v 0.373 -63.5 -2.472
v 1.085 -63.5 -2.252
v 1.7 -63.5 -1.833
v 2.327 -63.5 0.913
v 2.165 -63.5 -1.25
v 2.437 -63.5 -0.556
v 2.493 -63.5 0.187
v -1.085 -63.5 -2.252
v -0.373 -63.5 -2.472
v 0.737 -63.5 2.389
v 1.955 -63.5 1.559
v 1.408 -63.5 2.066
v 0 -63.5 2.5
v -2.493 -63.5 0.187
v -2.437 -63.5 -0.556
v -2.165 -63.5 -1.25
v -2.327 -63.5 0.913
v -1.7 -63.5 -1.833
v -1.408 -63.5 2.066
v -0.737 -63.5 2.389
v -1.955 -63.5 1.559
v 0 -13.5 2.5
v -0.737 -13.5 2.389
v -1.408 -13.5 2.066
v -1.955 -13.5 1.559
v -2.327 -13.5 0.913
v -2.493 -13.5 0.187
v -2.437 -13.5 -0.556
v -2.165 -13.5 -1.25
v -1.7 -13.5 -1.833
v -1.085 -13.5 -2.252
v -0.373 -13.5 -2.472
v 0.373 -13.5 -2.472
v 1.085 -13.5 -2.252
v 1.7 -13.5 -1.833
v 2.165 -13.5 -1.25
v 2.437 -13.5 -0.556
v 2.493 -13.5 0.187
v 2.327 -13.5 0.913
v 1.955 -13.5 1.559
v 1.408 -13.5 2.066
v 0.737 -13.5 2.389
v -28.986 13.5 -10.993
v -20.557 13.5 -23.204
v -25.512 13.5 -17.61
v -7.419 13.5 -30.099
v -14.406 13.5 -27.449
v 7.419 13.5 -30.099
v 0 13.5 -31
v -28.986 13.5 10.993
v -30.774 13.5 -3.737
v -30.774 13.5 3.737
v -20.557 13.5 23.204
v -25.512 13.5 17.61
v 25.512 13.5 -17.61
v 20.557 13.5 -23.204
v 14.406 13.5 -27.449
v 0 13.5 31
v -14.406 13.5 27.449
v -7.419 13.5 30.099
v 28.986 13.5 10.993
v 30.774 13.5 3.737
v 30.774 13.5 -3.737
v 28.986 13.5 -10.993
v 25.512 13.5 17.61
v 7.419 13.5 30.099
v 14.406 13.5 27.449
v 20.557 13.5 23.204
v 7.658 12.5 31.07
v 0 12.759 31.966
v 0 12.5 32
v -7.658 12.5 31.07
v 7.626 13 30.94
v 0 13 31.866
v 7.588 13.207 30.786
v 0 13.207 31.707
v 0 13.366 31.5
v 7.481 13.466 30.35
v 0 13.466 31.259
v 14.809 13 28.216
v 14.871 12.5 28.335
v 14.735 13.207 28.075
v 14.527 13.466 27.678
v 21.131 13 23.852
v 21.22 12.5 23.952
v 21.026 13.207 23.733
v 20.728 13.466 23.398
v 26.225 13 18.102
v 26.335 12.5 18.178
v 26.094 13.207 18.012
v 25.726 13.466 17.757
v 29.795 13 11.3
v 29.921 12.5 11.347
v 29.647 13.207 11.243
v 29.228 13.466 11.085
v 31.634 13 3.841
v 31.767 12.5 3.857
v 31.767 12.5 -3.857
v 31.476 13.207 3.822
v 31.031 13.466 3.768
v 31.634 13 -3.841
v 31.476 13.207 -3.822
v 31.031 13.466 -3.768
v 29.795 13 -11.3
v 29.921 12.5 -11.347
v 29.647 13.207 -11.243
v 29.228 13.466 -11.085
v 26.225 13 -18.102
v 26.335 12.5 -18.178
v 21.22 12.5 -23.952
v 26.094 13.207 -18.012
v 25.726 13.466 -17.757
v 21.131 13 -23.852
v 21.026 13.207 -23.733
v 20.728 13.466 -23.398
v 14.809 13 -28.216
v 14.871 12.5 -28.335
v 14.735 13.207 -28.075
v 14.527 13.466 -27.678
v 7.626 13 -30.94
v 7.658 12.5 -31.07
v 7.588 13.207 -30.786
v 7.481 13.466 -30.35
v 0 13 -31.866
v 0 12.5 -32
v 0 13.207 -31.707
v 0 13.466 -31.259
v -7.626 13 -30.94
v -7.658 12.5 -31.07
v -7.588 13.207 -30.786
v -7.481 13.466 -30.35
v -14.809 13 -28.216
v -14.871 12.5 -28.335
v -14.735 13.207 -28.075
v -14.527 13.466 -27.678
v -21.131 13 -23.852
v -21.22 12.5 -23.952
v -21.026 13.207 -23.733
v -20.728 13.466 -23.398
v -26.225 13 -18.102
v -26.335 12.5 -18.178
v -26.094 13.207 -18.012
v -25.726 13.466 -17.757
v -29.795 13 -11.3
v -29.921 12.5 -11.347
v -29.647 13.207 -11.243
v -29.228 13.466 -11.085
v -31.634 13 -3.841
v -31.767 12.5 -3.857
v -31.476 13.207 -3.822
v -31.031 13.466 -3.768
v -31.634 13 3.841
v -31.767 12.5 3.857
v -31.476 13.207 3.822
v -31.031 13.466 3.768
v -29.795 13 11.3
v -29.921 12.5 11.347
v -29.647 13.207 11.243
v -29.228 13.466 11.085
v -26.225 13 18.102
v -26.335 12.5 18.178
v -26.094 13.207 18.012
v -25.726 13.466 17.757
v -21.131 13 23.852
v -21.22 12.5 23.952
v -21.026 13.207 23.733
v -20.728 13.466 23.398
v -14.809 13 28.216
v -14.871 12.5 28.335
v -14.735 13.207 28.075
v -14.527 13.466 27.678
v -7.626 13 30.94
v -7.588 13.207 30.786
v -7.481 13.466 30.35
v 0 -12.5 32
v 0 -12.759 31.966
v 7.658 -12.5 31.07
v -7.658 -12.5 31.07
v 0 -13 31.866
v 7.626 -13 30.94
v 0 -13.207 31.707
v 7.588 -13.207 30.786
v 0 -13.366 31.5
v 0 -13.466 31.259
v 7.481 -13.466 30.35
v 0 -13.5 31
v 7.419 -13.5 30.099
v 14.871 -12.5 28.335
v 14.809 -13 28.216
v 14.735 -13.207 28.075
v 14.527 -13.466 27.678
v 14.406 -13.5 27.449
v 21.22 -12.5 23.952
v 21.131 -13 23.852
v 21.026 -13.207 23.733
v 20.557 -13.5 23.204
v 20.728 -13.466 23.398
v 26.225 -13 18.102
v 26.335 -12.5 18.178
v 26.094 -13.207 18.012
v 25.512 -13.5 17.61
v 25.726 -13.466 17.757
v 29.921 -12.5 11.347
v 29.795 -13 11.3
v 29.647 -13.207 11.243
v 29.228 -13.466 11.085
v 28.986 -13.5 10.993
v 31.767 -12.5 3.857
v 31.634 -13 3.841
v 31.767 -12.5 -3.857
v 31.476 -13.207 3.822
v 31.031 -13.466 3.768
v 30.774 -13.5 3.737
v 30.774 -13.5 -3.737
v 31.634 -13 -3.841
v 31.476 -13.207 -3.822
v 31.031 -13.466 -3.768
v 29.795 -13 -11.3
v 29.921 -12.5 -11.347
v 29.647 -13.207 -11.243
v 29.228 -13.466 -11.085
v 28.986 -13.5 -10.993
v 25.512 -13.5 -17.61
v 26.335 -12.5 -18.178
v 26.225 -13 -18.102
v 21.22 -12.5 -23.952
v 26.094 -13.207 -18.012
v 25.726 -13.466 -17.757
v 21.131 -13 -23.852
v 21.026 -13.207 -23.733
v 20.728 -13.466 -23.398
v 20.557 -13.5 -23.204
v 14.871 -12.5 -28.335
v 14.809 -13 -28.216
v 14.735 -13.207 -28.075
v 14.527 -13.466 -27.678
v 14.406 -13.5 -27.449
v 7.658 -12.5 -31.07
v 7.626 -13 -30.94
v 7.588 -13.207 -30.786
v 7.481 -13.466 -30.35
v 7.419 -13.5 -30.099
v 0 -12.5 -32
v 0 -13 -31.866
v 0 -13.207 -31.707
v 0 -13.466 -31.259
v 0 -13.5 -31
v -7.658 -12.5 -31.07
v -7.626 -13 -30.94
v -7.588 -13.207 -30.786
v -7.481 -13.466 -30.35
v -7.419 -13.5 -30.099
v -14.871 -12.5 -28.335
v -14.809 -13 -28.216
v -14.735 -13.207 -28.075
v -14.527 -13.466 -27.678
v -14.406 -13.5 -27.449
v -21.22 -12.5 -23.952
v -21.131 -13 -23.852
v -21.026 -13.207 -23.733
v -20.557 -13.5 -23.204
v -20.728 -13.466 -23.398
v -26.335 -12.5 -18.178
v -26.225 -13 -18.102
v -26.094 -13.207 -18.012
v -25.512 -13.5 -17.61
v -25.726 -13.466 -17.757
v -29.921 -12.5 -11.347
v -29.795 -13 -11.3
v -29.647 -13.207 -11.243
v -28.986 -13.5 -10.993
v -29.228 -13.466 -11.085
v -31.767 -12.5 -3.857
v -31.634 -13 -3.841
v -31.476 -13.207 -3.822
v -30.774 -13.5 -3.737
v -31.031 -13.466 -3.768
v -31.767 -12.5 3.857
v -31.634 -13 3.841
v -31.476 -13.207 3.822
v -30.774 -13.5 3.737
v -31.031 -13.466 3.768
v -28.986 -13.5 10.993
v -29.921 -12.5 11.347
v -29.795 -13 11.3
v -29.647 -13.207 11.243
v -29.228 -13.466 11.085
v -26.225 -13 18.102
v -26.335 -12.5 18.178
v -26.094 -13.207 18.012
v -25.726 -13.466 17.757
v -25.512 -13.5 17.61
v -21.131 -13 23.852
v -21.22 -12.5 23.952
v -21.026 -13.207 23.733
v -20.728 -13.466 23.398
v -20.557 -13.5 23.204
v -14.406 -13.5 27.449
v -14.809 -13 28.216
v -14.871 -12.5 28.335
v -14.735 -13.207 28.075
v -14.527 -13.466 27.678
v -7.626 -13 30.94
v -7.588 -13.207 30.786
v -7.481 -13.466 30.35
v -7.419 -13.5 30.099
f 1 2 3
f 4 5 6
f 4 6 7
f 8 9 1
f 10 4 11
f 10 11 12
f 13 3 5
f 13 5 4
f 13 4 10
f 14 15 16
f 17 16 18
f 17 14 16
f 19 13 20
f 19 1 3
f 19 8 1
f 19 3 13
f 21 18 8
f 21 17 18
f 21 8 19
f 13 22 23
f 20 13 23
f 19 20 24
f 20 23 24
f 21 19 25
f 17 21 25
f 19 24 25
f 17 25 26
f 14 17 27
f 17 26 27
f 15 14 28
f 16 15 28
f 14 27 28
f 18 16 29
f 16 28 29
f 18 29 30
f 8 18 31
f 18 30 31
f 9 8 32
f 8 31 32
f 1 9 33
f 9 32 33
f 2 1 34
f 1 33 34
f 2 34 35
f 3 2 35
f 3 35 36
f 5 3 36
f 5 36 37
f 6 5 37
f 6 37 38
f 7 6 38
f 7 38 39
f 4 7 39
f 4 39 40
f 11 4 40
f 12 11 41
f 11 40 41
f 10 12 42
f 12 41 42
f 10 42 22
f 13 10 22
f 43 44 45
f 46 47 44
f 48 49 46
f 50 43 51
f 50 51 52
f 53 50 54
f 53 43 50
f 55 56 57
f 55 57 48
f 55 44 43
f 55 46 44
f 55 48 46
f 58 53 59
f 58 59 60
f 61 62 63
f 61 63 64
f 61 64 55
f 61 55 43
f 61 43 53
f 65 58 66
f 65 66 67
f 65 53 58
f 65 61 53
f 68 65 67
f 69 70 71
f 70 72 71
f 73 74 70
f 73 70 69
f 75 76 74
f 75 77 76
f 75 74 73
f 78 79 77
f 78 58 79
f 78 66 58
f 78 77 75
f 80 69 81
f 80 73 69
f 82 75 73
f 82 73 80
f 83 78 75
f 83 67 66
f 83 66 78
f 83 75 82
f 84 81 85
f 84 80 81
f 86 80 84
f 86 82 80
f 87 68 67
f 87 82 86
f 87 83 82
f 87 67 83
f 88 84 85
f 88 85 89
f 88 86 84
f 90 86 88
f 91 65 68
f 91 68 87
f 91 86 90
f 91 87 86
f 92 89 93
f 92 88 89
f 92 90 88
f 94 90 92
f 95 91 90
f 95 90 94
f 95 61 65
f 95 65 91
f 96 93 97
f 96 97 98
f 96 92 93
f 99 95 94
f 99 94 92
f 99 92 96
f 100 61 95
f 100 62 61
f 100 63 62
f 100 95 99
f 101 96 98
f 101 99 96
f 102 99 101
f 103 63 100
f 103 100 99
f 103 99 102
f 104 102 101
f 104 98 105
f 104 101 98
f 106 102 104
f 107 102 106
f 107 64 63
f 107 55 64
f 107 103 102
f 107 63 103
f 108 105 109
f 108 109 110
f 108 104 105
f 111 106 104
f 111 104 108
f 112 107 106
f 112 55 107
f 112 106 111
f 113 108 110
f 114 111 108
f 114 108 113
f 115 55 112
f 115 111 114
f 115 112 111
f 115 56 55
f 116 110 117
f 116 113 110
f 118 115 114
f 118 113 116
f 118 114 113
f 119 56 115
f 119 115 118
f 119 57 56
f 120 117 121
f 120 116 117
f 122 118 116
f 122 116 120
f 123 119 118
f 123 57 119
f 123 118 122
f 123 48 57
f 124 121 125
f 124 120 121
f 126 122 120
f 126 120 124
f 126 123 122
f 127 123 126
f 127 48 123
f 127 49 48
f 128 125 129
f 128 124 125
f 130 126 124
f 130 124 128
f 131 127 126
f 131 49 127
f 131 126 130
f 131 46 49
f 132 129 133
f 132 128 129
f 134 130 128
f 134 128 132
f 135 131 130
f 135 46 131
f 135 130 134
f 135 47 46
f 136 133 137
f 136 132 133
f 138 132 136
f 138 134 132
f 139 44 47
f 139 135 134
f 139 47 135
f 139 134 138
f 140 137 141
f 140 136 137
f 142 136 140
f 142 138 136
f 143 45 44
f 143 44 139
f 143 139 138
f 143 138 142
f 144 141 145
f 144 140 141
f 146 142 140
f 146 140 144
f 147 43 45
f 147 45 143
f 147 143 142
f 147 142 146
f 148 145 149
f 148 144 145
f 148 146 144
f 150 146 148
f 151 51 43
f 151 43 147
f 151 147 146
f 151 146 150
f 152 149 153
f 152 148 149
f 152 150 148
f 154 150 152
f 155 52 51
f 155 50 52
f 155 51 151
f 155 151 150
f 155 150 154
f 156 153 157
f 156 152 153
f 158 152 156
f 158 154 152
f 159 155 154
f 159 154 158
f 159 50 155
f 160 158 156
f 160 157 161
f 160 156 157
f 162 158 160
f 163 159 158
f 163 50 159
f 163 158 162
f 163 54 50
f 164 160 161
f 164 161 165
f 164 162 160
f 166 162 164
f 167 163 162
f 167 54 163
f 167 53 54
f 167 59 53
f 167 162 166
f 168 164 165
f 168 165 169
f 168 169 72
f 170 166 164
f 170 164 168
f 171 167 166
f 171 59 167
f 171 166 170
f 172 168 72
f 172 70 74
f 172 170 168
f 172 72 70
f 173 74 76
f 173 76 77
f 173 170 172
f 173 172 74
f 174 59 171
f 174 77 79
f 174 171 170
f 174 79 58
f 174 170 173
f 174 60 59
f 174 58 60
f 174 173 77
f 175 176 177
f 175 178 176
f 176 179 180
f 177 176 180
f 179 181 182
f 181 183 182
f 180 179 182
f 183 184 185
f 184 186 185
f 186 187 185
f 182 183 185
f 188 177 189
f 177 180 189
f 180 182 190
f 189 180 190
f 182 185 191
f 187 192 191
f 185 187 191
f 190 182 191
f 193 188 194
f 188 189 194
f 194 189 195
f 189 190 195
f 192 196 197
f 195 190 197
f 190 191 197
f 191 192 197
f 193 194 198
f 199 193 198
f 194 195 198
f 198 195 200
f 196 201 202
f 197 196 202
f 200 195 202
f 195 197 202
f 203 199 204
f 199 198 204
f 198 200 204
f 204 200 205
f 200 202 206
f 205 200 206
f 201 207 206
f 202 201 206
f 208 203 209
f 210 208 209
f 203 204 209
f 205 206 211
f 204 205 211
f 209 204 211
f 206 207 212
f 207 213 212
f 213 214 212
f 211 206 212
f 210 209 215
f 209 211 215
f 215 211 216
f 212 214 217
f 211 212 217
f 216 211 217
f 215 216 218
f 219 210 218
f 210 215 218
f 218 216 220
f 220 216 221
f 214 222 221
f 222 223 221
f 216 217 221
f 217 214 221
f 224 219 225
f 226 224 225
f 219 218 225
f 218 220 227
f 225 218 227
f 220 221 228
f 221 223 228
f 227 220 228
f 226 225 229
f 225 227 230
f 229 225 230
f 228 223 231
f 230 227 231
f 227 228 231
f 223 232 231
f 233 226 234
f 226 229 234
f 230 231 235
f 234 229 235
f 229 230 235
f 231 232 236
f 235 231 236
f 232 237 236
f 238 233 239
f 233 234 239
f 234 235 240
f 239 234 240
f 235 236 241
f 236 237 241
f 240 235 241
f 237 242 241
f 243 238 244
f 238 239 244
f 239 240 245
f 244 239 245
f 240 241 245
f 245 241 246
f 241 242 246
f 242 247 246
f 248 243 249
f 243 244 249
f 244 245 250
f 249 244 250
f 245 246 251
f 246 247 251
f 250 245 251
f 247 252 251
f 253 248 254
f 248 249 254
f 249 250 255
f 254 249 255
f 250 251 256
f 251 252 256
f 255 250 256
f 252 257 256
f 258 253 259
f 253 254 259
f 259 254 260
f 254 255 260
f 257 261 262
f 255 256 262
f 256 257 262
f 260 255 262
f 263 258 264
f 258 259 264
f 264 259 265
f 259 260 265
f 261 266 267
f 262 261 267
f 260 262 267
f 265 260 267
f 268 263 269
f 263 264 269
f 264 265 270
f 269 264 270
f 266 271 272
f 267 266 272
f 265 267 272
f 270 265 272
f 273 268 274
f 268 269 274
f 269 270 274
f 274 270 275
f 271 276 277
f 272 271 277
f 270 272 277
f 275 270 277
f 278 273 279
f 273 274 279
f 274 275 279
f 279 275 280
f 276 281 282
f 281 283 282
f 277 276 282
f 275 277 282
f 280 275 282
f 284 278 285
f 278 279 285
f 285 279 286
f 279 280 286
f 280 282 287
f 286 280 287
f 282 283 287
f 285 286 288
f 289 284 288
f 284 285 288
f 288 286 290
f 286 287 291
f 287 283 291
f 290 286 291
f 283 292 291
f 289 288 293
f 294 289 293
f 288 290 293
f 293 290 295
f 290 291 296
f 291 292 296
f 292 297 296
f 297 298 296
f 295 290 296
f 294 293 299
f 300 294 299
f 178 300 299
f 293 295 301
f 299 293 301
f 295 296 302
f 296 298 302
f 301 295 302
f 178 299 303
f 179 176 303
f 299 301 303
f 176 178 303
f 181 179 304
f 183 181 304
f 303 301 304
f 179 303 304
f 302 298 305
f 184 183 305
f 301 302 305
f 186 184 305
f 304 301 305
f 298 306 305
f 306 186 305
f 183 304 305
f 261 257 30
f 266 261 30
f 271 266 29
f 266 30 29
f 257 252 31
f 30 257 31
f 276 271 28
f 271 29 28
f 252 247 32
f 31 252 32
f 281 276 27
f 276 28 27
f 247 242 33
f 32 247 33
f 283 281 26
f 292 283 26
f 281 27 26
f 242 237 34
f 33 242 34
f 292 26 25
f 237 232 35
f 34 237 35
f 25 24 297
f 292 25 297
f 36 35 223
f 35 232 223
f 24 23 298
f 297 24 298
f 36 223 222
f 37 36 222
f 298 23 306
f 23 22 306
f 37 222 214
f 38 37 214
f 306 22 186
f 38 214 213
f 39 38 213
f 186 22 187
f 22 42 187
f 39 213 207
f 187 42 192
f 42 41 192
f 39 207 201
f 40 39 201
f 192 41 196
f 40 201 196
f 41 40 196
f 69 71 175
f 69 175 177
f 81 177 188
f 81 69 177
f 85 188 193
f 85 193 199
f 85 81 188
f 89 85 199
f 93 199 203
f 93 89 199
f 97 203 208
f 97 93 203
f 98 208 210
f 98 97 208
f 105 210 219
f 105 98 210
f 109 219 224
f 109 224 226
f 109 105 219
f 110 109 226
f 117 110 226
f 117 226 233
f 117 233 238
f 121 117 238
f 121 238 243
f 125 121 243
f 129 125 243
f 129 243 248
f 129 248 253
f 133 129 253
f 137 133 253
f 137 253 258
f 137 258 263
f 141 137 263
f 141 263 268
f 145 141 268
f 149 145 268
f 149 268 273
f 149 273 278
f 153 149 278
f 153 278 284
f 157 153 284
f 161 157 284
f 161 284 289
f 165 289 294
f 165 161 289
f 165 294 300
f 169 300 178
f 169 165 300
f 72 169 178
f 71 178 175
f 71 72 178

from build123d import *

# Parameters (mm, degrees)
SKETCH1_R           = 32
BOSS_EXTRUDE1_DEPTH = 13.5
FILLET1_R           = 1
FILLET2_R           = 1
SKETCH2_R           = 2.5
BOSS_EXTRUDE2_DEPTH = 50


with BuildPart() as part:
    # Sketch1 → Boss-Extrude1 (new, symmetric)
    with BuildSketch(Plane(origin=(0, 0, 0), x_dir=(1, 0, 0), z_dir=(0, 1, 0))):
        with Locations(Location((0, 0, 0), (0, 0, 270))):
            Circle(SKETCH1_R)
    extrude(amount=BOSS_EXTRUDE1_DEPTH, both=True)

    # Fillet1
    fillet1_edges = [part.edges().sort_by_distance(p)[0] for p in [
        (0, -13.5, -32),
    ]]
    fillet(fillet1_edges, radius=FILLET1_R)

    # Fillet2
    fillet2_edges = [part.edges().sort_by_distance(p)[0] for p in [
        (0, 13.5, -32),
    ]]
    fillet(fillet2_edges, radius=FILLET2_R)

    # Sketch2 → Boss-Extrude2 (add)
    with BuildSketch(Plane(origin=(0, -13.5, 0), x_dir=(-1, 0, 0), z_dir=(0, -1, 0))):
        with Locations(Location((0, 0, 0), (0, 0, 270))):
            Circle(SKETCH2_R)
    extrude(amount=BOSS_EXTRUDE2_DEPTH)


solid = part.part
